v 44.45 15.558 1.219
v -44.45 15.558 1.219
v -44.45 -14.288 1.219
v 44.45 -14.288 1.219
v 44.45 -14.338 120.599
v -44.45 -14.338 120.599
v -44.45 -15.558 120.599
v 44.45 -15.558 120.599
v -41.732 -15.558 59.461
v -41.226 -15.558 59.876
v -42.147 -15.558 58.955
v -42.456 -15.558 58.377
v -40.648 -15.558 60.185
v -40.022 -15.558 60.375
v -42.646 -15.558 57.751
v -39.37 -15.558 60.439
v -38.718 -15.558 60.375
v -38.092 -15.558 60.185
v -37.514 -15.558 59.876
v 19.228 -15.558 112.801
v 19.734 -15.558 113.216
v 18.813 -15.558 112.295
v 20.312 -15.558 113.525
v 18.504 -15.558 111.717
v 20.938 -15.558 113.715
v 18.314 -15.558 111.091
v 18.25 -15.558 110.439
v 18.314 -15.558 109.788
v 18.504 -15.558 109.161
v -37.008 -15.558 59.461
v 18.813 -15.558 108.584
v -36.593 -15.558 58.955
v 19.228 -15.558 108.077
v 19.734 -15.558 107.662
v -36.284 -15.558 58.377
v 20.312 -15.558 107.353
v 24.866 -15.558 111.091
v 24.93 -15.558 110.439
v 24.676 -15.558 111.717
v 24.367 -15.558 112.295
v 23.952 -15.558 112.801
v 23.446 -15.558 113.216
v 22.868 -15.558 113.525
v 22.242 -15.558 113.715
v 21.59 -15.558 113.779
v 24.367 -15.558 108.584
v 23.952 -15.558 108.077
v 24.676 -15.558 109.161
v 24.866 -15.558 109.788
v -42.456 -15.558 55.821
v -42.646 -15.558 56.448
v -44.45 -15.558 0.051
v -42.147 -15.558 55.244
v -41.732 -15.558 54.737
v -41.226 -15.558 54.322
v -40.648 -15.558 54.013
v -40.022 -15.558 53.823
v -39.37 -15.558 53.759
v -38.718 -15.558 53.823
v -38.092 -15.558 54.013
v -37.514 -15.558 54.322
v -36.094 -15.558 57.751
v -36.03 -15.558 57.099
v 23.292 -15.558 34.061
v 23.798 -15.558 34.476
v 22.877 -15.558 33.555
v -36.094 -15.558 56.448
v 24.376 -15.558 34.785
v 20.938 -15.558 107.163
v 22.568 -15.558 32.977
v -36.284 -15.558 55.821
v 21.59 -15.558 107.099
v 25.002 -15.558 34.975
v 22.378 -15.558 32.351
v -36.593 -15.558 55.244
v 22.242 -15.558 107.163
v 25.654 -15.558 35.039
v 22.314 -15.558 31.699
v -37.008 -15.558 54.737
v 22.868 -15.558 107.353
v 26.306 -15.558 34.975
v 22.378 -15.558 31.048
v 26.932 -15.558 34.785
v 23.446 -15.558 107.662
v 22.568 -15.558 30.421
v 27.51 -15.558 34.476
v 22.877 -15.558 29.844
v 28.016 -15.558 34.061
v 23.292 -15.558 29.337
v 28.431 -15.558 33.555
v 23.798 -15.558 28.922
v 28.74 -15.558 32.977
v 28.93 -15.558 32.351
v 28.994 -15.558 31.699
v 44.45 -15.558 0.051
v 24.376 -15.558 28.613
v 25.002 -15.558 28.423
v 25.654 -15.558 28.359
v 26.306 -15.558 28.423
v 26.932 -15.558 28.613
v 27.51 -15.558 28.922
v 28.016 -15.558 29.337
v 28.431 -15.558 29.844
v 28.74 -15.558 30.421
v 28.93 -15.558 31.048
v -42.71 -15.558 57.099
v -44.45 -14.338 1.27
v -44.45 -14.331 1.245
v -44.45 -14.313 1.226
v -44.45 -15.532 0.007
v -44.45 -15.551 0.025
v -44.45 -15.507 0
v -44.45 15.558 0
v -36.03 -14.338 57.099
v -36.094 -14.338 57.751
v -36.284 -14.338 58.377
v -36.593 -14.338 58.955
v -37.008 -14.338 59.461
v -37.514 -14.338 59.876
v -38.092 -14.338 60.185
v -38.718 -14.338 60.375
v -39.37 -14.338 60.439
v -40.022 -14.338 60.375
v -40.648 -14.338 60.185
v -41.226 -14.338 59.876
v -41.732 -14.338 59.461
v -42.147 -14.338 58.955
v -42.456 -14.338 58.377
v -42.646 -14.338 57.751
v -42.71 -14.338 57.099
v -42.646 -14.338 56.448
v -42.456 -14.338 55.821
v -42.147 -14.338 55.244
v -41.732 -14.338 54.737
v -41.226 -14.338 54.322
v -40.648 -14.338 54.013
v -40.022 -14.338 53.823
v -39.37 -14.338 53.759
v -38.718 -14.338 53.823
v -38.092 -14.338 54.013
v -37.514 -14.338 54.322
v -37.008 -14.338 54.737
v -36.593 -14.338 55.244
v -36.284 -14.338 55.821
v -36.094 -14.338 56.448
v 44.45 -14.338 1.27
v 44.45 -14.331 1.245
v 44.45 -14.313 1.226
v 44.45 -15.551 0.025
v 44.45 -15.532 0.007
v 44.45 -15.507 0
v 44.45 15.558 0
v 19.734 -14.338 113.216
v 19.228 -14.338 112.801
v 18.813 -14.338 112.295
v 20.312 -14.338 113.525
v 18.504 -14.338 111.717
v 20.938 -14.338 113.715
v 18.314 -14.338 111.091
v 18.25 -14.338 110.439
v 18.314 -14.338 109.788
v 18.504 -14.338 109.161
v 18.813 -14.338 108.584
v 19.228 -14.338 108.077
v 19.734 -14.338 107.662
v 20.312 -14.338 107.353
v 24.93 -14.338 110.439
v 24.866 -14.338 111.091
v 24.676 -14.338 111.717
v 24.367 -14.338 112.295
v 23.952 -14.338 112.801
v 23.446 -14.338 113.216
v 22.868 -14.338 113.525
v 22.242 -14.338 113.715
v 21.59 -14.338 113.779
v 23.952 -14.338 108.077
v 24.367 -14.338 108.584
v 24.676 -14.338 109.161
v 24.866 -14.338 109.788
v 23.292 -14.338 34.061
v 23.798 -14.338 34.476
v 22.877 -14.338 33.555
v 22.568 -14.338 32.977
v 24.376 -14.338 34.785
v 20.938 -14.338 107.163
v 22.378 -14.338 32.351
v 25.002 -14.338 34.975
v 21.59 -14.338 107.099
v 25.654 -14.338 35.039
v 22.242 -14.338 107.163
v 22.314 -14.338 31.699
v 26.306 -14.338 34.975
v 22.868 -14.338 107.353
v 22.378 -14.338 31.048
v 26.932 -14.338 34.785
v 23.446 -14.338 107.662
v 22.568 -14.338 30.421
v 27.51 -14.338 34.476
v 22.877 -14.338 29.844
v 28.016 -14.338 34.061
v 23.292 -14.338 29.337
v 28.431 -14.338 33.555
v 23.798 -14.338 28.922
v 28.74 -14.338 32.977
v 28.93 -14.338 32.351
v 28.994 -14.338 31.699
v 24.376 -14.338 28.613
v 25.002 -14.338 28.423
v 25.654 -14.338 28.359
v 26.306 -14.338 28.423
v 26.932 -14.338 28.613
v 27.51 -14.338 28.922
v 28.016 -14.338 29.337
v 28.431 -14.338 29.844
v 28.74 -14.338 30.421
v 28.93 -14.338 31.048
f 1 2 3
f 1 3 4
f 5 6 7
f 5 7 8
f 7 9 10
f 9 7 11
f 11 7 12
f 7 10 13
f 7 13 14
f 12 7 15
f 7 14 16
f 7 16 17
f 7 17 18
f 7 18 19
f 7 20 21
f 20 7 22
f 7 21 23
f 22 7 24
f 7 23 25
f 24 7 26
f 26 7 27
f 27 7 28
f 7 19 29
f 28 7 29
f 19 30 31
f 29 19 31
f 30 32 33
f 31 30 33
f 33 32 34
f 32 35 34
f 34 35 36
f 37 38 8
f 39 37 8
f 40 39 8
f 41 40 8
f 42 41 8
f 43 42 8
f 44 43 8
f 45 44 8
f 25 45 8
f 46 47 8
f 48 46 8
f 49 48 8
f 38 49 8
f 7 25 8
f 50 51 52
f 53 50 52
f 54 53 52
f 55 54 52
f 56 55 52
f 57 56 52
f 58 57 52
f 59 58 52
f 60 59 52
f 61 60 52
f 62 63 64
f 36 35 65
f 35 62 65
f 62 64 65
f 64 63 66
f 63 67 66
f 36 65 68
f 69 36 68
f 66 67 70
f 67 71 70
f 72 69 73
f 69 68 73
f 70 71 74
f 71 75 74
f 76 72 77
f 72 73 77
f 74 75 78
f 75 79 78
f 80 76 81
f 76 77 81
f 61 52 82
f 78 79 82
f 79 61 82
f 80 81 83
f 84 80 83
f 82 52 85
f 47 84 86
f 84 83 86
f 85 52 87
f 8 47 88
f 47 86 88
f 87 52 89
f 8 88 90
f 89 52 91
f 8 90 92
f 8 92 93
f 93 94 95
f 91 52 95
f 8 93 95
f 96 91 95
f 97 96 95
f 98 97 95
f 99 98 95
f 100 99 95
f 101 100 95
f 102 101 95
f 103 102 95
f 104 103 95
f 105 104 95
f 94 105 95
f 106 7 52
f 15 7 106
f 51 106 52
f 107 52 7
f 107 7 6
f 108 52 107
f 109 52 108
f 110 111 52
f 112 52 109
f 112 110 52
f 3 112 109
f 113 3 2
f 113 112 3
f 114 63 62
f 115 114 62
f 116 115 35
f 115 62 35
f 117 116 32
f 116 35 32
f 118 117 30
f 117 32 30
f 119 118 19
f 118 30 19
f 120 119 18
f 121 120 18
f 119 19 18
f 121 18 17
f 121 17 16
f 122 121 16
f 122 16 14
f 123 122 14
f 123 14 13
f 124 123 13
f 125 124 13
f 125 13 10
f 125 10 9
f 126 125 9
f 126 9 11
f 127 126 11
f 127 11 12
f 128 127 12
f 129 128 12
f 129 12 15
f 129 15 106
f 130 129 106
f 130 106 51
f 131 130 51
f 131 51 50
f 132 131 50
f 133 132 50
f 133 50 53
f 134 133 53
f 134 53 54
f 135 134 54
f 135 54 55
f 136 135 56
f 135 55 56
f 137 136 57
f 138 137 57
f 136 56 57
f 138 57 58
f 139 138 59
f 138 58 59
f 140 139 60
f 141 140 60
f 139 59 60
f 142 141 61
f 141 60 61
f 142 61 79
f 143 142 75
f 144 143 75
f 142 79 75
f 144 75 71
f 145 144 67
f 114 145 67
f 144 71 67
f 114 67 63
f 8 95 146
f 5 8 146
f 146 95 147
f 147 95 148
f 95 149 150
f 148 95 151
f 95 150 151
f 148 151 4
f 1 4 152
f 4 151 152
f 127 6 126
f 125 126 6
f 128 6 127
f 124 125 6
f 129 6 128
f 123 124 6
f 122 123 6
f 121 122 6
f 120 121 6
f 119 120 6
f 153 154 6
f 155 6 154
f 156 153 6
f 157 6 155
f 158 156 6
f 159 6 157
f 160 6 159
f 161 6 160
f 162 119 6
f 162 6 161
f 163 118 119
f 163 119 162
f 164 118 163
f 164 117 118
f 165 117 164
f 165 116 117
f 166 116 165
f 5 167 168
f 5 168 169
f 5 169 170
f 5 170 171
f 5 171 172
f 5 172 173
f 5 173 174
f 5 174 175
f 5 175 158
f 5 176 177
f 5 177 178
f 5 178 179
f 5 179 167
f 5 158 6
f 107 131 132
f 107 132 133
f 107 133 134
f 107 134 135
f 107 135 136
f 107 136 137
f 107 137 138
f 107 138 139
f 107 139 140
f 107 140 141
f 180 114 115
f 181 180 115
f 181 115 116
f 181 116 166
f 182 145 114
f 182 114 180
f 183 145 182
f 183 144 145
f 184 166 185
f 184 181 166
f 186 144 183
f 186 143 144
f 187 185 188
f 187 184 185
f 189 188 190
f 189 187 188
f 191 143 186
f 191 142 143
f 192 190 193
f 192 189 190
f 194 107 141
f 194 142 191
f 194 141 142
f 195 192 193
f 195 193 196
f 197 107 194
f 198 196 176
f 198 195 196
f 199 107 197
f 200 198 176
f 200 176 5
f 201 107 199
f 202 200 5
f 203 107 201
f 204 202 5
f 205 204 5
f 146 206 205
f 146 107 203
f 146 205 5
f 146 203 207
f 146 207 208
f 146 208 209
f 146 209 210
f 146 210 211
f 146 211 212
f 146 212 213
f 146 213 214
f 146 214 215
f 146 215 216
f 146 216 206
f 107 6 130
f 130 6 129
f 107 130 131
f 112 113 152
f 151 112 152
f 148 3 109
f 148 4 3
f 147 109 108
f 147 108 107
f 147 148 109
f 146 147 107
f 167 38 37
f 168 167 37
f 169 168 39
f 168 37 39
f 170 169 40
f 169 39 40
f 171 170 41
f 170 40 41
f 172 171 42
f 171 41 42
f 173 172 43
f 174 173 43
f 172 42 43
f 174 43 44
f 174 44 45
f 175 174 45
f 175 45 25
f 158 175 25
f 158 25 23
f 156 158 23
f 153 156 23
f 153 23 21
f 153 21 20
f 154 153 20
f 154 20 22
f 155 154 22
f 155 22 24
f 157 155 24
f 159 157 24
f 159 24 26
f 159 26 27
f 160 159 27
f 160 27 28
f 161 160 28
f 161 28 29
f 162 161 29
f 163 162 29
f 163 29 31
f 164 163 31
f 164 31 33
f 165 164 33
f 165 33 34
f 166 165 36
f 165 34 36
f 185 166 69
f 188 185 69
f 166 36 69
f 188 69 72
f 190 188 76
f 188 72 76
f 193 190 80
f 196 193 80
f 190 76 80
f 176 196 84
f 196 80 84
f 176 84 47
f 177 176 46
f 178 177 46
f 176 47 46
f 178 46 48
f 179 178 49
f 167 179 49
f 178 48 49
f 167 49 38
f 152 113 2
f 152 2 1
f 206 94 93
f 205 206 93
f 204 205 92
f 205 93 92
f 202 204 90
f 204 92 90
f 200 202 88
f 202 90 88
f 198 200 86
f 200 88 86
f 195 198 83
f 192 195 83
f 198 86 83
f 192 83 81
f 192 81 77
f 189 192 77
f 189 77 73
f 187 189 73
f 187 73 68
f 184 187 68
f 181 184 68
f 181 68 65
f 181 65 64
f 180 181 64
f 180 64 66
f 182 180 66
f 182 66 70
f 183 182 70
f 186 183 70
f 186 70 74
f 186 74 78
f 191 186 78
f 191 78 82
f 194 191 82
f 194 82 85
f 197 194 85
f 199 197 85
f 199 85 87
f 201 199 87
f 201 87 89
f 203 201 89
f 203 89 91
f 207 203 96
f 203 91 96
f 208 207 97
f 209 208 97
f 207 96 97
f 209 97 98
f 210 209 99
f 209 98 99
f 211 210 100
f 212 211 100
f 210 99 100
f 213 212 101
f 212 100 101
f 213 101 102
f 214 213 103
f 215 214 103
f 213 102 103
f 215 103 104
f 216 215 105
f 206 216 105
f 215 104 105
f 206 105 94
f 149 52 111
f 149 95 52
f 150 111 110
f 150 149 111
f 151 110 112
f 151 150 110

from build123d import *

# Parameters (mm, degrees)
F0_W     = 88.9
F0_H     = 31.115
F1_DEPTH = 1.2192
F2_W     = 88.9
F2_H     = 1.2192
F3_DEPTH = 119.38
F4_R     = 0.0508
F5_R     = 3.3401
F6_DEPTH = 25.4


with BuildPart() as f1:
    # F0 (on Top) → F1 (new body)
    with BuildSketch(Plane.XY):
        Rectangle(F0_W, F0_H)
    extrude(amount=F1_DEPTH)

    # F2 (on face) → F3 (join)
    with BuildSketch(Plane.XY.offset(1.2192)):
        with Locations((0, -14.9479)):
            Rectangle(F2_W, F2_H)
    extrude(amount=F3_DEPTH)

    # F4
    f4_edges = [f1.edges().sort_by_distance(p)[0] for p in [
        (0, -15.5575, 0),
        (0, -14.3383, 1.2192),
    ]]
    fillet(f4_edges, radius=F4_R)

    # F5 (on face) → F6 (cut)
    with BuildSketch(Plane.XZ.offset(15.5575)):
        with Locations((21.59, 110.4392)):
            Circle(F5_R)
        with Locations((25.654, 31.6992)):
            Circle(F5_R)
        with Locations((-39.37, 57.0992)):
            Circle(F5_R)
    extrude(amount=-F6_DEPTH, mode=Mode.SUBTRACT)


solid = f1.part
